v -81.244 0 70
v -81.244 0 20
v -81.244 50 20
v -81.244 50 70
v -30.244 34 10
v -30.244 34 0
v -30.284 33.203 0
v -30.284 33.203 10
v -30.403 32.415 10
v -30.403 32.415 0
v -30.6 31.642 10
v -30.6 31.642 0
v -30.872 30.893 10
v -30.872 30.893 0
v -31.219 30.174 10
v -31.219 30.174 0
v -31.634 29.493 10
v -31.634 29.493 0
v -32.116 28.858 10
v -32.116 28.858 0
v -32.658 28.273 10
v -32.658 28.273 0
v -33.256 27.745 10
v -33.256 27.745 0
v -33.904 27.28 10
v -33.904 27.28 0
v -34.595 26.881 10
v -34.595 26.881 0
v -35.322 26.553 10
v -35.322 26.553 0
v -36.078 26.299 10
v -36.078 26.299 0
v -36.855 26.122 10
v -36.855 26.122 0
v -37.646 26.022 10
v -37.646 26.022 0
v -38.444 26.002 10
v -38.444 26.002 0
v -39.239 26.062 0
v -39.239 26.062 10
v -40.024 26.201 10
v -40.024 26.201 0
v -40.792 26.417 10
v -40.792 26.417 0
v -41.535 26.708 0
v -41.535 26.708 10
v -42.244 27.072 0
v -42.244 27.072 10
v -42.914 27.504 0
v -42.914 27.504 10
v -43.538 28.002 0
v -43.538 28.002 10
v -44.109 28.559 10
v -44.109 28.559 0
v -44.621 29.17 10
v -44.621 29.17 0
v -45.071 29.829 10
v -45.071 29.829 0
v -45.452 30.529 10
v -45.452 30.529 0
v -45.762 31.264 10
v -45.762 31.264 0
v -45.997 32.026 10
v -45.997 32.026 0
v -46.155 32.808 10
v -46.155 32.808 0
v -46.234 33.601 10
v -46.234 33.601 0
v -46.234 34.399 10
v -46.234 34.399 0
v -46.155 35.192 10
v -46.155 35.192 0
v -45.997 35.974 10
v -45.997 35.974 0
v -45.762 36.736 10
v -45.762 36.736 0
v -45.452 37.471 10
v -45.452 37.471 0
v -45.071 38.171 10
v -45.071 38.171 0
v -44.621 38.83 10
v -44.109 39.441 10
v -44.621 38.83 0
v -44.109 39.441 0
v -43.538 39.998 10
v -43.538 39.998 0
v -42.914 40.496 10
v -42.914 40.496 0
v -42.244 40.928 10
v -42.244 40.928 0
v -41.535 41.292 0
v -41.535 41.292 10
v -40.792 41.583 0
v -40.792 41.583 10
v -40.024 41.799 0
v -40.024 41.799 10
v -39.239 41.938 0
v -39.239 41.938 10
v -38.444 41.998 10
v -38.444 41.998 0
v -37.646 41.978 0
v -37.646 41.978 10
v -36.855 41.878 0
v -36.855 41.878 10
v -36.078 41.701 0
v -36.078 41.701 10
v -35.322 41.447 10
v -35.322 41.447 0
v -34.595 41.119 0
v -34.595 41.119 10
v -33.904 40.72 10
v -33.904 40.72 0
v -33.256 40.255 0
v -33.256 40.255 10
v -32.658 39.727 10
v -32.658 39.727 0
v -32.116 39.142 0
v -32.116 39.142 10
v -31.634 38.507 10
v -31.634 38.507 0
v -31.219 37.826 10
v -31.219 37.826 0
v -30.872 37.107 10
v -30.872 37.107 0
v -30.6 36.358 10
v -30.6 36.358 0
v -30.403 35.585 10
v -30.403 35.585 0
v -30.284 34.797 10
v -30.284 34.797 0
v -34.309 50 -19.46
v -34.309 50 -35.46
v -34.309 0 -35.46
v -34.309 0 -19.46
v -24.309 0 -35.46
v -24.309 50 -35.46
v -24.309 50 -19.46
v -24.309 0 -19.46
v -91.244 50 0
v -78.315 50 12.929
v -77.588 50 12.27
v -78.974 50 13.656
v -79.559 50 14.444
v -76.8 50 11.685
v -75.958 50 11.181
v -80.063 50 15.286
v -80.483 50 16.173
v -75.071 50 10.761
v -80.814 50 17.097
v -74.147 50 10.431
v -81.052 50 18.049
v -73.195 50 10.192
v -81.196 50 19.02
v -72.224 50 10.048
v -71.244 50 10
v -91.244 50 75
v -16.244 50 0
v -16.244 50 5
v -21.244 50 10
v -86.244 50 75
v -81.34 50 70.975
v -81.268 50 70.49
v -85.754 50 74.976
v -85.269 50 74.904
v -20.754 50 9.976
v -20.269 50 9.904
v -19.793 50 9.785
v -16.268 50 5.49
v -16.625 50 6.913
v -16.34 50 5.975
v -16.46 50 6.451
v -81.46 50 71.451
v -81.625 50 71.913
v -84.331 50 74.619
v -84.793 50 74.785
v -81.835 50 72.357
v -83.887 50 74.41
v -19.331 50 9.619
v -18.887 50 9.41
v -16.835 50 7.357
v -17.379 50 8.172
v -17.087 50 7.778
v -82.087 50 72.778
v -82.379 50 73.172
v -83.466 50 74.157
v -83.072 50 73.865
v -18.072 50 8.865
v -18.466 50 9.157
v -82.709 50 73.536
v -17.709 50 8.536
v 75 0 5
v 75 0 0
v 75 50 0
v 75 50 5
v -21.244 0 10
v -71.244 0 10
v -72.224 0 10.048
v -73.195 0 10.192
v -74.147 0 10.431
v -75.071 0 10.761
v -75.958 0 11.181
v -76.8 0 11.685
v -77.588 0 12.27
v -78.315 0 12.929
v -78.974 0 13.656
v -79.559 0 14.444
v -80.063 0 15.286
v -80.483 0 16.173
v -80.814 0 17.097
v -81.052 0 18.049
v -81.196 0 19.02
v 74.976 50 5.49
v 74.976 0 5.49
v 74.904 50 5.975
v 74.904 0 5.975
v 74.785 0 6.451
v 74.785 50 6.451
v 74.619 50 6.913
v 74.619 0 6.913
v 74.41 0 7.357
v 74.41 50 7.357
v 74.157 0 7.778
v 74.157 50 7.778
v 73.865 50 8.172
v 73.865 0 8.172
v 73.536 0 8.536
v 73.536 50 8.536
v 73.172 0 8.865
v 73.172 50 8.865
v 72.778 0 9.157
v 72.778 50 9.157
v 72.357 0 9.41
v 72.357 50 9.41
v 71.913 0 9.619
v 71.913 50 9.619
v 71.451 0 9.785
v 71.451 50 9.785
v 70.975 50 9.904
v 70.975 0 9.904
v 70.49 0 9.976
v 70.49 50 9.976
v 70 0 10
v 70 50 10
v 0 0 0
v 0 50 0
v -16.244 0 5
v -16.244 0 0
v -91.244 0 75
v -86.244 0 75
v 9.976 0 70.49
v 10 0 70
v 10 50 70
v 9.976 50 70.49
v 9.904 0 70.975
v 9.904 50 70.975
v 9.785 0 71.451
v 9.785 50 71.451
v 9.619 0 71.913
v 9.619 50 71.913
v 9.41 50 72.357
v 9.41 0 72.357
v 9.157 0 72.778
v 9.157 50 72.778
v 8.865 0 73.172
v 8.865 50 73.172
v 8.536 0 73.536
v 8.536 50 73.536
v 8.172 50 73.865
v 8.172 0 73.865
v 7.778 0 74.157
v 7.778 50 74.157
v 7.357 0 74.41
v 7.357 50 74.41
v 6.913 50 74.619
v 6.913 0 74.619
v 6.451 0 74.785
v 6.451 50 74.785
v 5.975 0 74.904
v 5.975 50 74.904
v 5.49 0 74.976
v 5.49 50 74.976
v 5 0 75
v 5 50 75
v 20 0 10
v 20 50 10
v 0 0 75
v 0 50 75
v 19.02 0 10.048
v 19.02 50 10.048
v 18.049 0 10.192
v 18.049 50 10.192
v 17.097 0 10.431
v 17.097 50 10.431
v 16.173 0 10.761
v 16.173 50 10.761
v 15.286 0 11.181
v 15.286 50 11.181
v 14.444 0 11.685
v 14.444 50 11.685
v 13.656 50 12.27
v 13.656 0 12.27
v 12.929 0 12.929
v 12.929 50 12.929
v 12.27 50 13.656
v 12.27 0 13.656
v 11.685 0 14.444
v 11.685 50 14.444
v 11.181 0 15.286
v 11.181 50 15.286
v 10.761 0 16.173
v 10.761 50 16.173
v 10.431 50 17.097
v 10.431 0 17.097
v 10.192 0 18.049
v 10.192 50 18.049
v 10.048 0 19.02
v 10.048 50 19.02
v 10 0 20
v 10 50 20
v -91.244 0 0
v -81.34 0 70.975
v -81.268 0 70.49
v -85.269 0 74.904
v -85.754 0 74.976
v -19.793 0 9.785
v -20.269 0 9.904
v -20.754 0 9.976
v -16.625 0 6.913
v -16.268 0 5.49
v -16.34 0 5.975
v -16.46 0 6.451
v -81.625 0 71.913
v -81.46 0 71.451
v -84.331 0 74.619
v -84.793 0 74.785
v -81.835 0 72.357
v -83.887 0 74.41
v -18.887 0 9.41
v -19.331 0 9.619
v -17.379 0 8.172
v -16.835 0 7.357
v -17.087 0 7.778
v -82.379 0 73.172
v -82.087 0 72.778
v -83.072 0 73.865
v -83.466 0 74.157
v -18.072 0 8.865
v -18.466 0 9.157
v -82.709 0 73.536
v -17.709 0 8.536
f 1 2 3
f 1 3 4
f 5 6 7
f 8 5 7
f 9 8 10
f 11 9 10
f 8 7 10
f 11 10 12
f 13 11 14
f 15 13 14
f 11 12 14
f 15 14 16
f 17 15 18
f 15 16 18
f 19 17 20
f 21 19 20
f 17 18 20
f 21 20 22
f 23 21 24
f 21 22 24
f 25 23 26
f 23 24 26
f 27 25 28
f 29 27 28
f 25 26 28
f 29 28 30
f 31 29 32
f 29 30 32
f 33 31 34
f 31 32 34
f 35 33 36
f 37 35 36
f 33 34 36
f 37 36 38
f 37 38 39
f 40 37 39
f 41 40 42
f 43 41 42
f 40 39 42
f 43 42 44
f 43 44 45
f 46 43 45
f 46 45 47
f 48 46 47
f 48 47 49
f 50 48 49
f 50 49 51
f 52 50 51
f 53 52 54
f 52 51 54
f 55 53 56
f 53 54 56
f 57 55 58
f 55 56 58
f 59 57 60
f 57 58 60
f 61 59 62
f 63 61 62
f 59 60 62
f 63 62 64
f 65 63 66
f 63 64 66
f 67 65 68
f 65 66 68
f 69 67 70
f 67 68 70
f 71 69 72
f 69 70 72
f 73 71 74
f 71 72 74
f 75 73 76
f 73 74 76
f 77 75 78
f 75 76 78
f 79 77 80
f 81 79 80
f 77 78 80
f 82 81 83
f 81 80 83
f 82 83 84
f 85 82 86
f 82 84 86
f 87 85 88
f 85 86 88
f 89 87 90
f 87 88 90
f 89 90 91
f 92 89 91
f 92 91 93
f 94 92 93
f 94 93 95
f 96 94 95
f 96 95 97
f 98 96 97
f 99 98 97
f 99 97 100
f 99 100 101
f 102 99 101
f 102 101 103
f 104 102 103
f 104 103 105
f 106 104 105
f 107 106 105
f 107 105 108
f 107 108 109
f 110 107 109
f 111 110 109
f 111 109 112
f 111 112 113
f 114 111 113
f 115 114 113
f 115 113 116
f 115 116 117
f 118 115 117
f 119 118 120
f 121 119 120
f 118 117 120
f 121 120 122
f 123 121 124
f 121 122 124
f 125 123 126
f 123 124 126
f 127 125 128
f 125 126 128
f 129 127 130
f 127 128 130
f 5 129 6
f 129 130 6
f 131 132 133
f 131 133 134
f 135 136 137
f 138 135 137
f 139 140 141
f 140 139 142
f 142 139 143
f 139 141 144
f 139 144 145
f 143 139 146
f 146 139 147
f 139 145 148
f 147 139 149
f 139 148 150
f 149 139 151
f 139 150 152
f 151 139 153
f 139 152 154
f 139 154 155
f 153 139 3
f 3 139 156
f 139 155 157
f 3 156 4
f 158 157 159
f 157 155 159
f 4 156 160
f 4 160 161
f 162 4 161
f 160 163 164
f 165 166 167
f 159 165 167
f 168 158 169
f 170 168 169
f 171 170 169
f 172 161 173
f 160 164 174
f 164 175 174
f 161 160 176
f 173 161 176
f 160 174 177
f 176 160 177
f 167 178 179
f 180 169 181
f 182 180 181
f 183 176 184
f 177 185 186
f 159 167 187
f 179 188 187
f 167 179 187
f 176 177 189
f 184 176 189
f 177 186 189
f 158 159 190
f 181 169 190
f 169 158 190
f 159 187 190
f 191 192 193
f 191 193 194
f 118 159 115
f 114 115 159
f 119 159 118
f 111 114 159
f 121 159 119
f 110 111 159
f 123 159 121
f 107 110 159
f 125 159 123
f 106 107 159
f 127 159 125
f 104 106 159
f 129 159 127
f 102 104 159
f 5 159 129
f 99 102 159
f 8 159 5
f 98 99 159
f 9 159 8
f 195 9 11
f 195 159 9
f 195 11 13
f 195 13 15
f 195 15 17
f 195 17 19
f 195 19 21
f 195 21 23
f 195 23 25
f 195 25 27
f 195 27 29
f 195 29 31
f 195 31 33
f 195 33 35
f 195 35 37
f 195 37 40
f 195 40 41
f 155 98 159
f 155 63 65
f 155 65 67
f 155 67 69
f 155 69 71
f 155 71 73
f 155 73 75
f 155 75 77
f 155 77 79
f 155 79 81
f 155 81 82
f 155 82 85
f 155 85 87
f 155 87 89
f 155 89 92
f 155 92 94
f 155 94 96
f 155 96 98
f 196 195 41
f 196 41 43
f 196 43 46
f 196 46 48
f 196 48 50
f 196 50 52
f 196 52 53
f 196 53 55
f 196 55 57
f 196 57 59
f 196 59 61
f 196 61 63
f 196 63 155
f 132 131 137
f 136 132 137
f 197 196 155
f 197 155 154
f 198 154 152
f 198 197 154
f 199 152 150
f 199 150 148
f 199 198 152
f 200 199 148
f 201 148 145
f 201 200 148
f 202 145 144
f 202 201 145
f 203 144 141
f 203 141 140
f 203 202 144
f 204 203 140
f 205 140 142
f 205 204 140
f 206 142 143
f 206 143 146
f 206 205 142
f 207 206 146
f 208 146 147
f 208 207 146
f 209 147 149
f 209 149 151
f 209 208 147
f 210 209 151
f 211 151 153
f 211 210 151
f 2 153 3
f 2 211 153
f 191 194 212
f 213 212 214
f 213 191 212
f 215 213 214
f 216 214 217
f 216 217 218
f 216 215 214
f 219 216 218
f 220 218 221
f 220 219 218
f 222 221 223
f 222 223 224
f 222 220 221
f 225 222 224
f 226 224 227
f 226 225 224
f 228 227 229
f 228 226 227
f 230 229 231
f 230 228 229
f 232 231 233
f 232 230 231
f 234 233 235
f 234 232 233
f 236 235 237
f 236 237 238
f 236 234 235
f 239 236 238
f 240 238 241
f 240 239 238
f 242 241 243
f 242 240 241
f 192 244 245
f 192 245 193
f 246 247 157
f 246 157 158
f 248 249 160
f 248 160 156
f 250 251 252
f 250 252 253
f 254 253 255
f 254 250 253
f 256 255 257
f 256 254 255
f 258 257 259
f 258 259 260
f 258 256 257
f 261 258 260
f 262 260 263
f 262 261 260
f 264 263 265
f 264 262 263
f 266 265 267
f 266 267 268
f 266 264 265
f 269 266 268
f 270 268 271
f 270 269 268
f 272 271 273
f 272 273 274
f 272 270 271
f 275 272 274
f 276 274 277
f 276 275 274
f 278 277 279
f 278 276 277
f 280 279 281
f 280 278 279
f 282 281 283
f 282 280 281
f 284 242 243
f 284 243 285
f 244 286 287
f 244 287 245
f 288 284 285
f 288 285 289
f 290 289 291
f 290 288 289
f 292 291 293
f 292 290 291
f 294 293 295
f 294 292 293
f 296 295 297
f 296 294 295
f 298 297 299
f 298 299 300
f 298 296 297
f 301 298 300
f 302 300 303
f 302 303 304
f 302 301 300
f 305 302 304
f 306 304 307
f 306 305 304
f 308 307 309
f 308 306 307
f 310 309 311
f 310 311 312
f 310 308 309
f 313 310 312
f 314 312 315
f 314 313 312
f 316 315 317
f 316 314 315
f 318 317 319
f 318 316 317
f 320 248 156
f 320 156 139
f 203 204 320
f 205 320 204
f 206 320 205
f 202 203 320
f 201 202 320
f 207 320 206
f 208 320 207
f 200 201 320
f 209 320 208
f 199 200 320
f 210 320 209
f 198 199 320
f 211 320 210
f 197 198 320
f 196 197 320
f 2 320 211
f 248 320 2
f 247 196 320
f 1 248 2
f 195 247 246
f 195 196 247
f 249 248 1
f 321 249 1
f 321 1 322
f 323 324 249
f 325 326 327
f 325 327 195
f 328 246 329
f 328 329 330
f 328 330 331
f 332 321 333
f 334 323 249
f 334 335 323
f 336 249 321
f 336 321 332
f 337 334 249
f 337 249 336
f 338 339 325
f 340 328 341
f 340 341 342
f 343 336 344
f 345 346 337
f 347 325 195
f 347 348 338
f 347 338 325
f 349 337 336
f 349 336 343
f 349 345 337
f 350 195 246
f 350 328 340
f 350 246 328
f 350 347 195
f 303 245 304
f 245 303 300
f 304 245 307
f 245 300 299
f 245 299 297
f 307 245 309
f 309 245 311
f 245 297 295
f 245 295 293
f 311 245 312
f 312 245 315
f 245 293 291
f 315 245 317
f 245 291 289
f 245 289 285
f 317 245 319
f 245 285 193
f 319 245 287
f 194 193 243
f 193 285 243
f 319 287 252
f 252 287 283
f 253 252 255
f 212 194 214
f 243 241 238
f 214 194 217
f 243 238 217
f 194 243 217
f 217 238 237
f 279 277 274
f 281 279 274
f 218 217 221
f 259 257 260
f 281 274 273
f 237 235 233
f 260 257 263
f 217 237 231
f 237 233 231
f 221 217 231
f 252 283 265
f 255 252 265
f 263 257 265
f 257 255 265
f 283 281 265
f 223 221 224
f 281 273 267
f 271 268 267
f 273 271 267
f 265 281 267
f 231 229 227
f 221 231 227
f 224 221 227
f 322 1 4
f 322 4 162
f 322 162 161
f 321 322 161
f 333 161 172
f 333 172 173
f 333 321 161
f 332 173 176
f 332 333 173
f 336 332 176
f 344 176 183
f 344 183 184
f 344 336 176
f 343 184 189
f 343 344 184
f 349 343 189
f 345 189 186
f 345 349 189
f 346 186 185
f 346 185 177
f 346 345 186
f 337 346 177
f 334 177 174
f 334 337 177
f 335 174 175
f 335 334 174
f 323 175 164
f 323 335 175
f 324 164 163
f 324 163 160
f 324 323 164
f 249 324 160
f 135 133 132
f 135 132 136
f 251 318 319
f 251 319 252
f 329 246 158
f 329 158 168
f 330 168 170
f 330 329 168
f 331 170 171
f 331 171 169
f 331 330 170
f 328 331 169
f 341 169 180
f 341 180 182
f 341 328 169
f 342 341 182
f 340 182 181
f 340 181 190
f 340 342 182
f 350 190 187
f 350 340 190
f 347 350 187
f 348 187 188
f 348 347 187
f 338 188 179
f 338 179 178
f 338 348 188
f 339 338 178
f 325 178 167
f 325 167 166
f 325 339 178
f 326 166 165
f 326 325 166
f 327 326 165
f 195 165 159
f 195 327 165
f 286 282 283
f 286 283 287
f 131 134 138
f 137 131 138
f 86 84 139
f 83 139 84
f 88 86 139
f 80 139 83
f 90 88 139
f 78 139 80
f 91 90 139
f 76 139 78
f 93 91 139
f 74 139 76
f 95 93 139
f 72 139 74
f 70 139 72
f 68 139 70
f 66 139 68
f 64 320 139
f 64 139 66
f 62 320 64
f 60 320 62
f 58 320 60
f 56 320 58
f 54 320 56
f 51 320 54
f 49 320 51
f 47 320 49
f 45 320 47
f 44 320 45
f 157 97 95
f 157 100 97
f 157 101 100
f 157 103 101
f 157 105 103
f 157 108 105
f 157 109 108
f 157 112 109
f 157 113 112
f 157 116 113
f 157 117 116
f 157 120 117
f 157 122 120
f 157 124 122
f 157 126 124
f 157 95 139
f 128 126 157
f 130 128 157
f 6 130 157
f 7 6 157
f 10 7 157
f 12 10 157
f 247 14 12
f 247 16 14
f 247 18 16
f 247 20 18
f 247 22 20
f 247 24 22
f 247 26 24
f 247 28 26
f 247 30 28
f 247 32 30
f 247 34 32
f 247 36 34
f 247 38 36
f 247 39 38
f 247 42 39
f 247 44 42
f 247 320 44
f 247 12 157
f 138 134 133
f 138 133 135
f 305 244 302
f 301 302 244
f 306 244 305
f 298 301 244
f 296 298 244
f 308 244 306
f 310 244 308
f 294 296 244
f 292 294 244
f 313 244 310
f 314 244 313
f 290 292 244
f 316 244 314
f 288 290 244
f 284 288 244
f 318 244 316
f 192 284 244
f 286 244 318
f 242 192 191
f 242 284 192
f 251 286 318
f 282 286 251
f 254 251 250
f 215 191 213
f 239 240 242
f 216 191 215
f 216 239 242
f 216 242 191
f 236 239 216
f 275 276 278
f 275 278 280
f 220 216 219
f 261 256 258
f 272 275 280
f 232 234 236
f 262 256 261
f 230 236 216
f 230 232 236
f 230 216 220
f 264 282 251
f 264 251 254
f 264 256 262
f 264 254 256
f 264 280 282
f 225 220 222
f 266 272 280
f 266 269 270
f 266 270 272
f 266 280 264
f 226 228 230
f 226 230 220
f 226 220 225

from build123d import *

# Parameters (mm, degrees)
F2_DEPTH = 50
F3_R     = 8
F4_DEPTH = 10
F5_W     = 10
F5_H     = 16
F6_DEPTH = 50


with BuildPart() as f2:
    # F0 (on Front) + F1 (on Front) → F2 (new body)
    with BuildSketch(Plane.XZ):
        with BuildLine():
            Line((0, 75), (0, 0))
            Line((0, 0), (75, 0))
            Line((75, 0), (75, 5))
            ThreePointArc((75, 5), (73.535534, 8.535534), (70, 10))
            Line((70, 10), (20, 10))
            ThreePointArc((20, 10), (12.928932, 12.928932), (10, 20))
            Line((10, 20), (10, 70))
            ThreePointArc((10, 70), (8.535534, 73.535534), (5, 75))
            Line((5, 75), (0, 75))
        make_face()
    with BuildSketch(Plane.XZ):
        with BuildLine():
            Line((-91.244273, 75), (-91.244273, 0))
            Line((-91.244273, 0), (-16.244273, 0))
            Line((-16.244273, 0), (-16.244273, 5))
            ThreePointArc((-16.244273, 5), (-17.708739, 8.535534), (-21.244273, 10))
            Line((-21.244273, 10), (-71.244273, 10))
            ThreePointArc((-71.244273, 10), (-78.315341, 12.928932), (-81.244273, 20))
            Line((-81.244273, 20), (-81.244273, 70))
            ThreePointArc((-81.244273, 70), (-82.708739, 73.535534), (-86.244273, 75))
            Line((-86.244273, 75), (-91.244273, 75))
        make_face()
    extrude(amount=-F2_DEPTH)

    # F3 (on face) → F4 (cut, through all)
    with BuildSketch(Plane(origin=(0, 0, 0), x_dir=(1, 0, 0), z_dir=(0, 0, -1))):
        with Locations((-38.244273, -34)):
            Circle(F3_R)
    extrude(amount=-F4_DEPTH, mode=Mode.SUBTRACT)


with BuildPart() as f6:
    # F5 (on Front) → F6 (new body)
    with BuildSketch(Plane.XZ):
        with Locations((-29.30879, -27.459602)):
            Rectangle(F5_W, F5_H)
    extrude(amount=-F6_DEPTH)


solid = Compound([f2.part, f6.part])
